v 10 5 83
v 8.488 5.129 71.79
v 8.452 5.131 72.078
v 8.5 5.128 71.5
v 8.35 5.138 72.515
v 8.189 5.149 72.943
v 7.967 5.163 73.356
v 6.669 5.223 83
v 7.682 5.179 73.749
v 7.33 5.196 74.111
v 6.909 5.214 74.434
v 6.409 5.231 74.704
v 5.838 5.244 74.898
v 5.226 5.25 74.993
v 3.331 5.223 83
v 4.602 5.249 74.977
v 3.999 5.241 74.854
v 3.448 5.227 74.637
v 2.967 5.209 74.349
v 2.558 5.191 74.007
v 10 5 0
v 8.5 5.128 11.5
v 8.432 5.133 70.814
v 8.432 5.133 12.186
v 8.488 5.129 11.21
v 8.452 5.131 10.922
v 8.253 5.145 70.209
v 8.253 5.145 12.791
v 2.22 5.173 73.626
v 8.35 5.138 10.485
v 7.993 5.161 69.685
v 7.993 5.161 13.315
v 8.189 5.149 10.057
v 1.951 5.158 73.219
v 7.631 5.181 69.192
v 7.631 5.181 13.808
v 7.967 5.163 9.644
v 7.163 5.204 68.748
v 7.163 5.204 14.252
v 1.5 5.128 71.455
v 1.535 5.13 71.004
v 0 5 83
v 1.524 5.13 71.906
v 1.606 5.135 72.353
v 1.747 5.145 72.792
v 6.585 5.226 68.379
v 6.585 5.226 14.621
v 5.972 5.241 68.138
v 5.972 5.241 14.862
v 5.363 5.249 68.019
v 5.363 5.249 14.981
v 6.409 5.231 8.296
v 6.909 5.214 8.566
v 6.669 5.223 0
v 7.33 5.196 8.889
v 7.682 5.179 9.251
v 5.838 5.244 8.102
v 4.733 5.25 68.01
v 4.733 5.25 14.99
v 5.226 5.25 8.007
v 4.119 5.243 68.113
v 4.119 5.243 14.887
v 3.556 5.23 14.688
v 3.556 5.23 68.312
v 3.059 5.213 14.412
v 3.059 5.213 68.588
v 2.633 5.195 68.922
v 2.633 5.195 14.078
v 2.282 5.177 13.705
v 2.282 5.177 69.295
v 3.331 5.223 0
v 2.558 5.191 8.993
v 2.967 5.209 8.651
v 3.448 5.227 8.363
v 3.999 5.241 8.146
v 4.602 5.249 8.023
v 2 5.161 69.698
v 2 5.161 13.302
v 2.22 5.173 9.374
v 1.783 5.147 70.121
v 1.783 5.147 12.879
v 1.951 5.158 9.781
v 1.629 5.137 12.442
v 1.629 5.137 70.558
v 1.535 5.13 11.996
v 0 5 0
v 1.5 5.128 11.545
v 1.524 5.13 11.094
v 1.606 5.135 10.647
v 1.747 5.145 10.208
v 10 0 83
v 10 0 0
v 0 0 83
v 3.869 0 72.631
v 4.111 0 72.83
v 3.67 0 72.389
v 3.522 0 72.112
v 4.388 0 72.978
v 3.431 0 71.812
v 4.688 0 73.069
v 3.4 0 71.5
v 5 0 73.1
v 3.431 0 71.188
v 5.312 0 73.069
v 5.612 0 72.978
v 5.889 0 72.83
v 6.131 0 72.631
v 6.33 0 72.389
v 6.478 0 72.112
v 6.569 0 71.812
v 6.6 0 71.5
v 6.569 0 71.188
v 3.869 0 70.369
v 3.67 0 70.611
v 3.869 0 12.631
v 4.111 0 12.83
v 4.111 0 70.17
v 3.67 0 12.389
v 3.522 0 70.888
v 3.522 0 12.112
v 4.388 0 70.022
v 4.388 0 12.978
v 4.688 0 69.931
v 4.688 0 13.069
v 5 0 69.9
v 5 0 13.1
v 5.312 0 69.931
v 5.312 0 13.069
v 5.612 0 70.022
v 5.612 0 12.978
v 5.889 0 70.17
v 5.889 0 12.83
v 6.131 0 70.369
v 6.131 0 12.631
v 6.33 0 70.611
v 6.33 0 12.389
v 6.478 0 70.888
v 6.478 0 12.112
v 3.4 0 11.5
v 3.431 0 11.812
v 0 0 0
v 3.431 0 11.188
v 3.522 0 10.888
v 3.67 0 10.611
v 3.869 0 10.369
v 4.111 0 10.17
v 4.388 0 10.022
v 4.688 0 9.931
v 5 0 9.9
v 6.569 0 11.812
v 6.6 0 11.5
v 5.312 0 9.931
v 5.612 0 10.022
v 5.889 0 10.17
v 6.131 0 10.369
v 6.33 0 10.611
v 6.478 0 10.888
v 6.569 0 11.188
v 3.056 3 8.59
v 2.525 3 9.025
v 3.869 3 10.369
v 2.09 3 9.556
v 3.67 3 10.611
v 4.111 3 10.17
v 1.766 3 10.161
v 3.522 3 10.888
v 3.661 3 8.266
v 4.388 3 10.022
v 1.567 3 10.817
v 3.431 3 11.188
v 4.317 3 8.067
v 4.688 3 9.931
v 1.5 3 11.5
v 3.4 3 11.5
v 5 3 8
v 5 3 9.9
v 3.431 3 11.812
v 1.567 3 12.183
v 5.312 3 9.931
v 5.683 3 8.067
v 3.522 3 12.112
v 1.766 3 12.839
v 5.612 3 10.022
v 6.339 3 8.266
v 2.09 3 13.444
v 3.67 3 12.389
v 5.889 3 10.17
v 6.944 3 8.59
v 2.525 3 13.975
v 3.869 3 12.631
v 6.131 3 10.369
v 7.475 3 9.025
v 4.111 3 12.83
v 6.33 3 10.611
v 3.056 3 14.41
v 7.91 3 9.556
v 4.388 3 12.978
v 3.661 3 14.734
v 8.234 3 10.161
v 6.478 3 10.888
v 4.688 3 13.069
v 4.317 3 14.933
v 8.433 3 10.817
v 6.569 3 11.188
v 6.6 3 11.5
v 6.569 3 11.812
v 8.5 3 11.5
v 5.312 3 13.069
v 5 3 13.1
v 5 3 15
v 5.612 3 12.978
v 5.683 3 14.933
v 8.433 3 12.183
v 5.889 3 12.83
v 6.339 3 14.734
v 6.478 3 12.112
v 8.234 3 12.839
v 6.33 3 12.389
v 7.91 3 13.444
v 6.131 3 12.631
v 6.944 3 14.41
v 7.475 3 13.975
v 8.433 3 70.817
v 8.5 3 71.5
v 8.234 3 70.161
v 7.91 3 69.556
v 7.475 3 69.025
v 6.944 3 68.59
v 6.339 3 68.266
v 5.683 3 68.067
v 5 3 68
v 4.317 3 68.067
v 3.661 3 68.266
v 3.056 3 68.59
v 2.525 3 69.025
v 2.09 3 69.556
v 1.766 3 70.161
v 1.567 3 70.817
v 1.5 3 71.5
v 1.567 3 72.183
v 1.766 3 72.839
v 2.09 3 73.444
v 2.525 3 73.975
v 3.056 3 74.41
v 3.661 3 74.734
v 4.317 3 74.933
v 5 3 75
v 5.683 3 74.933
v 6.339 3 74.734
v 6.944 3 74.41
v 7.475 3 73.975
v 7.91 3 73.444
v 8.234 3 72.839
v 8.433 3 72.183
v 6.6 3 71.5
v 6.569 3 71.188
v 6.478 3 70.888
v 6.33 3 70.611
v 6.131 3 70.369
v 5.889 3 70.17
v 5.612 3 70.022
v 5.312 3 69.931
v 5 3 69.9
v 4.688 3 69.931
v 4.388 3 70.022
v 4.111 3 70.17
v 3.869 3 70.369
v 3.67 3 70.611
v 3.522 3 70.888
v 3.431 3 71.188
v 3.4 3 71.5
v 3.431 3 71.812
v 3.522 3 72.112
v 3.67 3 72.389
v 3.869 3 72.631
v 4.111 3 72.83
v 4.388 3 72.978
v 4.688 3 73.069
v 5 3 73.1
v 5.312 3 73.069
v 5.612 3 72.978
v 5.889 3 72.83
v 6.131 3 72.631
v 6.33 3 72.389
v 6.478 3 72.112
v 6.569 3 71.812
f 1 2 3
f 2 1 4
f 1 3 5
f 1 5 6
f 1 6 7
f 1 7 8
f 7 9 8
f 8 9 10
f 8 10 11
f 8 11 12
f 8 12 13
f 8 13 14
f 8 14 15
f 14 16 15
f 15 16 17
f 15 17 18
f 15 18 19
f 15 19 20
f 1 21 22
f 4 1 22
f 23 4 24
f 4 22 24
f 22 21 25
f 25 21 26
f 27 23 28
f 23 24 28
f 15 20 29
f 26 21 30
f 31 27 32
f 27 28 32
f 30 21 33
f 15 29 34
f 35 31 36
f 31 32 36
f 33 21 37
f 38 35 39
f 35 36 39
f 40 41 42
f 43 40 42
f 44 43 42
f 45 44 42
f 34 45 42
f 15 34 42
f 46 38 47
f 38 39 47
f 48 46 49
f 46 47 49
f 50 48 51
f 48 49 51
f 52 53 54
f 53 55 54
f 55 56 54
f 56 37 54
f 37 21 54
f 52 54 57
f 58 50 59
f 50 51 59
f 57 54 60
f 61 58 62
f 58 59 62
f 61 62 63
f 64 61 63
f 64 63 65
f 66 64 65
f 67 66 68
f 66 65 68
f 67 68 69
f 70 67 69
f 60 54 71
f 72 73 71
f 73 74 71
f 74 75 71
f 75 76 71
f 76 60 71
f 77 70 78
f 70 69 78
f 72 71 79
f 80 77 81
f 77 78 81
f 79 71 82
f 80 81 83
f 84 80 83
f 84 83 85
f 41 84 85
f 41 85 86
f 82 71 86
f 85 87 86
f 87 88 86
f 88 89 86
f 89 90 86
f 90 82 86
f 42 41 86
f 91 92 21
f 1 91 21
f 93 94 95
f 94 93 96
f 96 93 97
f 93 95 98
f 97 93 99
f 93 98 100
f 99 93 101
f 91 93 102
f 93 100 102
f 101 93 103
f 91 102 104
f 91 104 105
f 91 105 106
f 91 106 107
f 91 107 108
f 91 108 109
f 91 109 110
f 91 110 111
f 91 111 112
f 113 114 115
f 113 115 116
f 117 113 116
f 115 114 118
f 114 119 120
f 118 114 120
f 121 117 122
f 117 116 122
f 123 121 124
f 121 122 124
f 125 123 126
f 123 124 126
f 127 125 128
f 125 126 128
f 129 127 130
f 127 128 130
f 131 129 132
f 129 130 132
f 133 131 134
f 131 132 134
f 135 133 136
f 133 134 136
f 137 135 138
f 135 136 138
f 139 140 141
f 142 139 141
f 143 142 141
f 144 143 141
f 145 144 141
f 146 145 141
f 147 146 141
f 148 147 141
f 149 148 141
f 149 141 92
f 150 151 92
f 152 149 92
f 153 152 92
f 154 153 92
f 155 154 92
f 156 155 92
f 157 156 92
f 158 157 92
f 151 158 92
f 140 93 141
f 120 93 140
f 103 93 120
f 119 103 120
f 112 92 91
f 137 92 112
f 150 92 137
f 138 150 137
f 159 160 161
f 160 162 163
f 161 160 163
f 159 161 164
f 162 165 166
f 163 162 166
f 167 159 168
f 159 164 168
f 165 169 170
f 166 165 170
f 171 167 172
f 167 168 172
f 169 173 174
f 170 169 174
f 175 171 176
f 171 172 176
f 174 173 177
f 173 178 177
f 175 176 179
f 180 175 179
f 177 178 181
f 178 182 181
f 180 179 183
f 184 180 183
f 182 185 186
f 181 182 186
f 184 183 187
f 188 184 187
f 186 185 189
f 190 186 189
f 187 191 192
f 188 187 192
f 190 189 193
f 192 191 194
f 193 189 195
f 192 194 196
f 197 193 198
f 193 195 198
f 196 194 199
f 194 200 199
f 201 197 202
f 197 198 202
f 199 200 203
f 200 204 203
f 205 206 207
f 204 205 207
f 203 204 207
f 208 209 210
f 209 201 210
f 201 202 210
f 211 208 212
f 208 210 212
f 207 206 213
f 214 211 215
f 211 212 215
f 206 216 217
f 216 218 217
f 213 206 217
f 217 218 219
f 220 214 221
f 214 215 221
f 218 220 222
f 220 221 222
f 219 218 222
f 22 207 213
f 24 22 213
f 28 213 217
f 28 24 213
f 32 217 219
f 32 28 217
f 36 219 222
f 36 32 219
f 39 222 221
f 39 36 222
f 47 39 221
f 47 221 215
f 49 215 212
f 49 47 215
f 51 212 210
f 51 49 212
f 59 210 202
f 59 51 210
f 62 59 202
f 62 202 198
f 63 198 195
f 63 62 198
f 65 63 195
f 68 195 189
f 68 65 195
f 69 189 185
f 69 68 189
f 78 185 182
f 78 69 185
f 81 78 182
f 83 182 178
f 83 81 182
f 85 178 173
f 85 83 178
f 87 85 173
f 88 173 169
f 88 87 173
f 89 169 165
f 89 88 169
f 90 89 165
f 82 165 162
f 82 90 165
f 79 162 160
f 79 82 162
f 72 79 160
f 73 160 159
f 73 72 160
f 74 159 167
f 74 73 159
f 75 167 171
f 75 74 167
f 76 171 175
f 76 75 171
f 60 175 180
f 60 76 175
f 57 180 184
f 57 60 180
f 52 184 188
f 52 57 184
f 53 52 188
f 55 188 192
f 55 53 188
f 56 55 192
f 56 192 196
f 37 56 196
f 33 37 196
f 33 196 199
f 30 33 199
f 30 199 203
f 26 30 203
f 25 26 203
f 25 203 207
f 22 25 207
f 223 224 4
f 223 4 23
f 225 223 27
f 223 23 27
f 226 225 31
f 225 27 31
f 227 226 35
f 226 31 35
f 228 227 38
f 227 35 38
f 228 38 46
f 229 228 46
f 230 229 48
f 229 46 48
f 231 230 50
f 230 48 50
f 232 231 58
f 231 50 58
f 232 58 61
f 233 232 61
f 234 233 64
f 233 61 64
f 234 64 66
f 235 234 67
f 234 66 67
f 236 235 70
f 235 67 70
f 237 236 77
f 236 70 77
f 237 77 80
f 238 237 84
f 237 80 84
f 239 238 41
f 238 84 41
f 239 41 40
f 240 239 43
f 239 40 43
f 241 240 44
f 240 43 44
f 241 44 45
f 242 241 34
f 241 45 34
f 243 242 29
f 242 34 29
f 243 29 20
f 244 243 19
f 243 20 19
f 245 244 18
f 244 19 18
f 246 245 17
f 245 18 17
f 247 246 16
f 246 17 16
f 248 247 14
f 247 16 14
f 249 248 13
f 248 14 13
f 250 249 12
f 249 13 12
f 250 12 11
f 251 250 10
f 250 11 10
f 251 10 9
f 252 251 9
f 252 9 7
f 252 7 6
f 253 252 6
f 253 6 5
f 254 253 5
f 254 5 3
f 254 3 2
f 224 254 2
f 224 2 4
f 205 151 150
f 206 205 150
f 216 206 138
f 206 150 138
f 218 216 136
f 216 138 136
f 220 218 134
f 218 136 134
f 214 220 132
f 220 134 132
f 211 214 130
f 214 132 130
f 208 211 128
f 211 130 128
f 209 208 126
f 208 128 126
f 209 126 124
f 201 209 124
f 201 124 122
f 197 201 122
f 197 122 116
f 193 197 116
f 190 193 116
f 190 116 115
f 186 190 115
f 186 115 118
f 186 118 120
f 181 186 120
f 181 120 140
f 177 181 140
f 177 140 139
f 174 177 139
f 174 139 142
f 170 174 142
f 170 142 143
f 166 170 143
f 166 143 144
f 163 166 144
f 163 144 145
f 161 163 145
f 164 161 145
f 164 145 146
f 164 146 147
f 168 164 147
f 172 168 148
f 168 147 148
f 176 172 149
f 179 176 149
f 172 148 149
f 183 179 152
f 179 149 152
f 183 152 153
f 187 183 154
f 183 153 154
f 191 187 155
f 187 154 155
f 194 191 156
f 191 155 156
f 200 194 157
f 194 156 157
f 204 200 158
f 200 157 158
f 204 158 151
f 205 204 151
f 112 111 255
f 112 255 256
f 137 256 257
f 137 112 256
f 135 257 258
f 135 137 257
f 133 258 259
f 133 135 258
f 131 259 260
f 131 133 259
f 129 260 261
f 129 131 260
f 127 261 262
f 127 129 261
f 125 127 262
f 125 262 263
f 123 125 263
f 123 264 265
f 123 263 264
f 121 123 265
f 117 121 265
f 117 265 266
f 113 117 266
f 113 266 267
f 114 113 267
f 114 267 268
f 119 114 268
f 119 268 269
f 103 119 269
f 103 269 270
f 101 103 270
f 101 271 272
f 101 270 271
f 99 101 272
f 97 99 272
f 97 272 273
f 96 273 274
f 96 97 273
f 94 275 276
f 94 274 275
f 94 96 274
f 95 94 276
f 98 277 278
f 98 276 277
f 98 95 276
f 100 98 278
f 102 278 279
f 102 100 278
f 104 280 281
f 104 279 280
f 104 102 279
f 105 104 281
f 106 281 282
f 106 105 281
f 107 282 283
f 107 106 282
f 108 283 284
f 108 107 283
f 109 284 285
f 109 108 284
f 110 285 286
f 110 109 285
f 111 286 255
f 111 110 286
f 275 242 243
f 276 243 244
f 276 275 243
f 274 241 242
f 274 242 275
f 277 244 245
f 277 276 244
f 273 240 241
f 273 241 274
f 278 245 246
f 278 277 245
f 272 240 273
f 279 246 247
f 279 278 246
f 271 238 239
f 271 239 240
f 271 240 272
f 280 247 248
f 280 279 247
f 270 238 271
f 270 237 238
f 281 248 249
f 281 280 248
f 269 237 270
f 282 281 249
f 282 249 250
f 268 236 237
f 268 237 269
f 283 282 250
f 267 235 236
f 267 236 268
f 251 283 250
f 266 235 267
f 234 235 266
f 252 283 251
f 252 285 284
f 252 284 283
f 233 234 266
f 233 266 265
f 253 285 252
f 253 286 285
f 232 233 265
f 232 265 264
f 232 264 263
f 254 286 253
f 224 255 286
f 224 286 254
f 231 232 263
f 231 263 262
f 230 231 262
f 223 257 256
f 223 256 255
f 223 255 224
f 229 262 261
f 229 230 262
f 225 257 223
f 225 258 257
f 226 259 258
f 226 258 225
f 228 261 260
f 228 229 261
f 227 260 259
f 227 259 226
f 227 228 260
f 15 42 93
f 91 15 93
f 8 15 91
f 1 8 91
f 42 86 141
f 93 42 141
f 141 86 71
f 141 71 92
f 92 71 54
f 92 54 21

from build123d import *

# Parameters (mm, degrees)
EXTRUDE_1_DEPTH     = 83
CUT_EXTRUDE_START   = -10
SKETCH_6_R          = 1.6
CUT_EXTRUDE_1_DEPTH = 15
SKETCH_5_R          = 3.5
CUT_EXTRUDE_2_DEPTH = 2


with BuildPart() as part:
    # 草图1 → 凸台-拉伸1 (new body)
    with BuildSketch(Plane.XY):
        with BuildLine():
            Line((0, 0), (10, 0))
            Line((10, 0), (10, 5))
            ThreePointArc((10, 5), (5, 5.250628145), (0, 5))
            Line((0, 5), (0, 0))
        make_face()
    extrude(amount=EXTRUDE_1_DEPTH)

    # 草图6 → 切除-拉伸1 (cut)
    with BuildSketch(Plane(origin=(0, 5, 0), x_dir=(1, 0, 0), z_dir=(0, 1, 0)).offset(CUT_EXTRUDE_START)):
        with Locations((5, -71.5)):
            Circle(SKETCH_6_R)
    cut_extrude_1 = extrude(amount=CUT_EXTRUDE_1_DEPTH, mode=Mode.SUBTRACT)

    # 草图5 → 切除-拉伸2 (cut, symmetric)
    with BuildSketch(Plane(origin=(0, 5, 0), x_dir=(1, 0, 0), z_dir=(0, 1, 0))):
        with Locations((5, -71.5)):
            Circle(SKETCH_5_R)
    cut_extrude_2 = extrude(amount=CUT_EXTRUDE_2_DEPTH, both=True, mode=Mode.SUBTRACT)

    # 镜向1: 切除-拉伸1, 切除-拉伸2 across plane
    add(cut_extrude_1.mirror(Plane(origin=(0, 0, 41.5), x_dir=(1, 0, 0), z_dir=(0, 0, -1))), mode=Mode.SUBTRACT)
    add(cut_extrude_2.mirror(Plane(origin=(0, 0, 41.5), x_dir=(1, 0, 0), z_dir=(0, 0, -1))), mode=Mode.SUBTRACT)


solid = part.part
